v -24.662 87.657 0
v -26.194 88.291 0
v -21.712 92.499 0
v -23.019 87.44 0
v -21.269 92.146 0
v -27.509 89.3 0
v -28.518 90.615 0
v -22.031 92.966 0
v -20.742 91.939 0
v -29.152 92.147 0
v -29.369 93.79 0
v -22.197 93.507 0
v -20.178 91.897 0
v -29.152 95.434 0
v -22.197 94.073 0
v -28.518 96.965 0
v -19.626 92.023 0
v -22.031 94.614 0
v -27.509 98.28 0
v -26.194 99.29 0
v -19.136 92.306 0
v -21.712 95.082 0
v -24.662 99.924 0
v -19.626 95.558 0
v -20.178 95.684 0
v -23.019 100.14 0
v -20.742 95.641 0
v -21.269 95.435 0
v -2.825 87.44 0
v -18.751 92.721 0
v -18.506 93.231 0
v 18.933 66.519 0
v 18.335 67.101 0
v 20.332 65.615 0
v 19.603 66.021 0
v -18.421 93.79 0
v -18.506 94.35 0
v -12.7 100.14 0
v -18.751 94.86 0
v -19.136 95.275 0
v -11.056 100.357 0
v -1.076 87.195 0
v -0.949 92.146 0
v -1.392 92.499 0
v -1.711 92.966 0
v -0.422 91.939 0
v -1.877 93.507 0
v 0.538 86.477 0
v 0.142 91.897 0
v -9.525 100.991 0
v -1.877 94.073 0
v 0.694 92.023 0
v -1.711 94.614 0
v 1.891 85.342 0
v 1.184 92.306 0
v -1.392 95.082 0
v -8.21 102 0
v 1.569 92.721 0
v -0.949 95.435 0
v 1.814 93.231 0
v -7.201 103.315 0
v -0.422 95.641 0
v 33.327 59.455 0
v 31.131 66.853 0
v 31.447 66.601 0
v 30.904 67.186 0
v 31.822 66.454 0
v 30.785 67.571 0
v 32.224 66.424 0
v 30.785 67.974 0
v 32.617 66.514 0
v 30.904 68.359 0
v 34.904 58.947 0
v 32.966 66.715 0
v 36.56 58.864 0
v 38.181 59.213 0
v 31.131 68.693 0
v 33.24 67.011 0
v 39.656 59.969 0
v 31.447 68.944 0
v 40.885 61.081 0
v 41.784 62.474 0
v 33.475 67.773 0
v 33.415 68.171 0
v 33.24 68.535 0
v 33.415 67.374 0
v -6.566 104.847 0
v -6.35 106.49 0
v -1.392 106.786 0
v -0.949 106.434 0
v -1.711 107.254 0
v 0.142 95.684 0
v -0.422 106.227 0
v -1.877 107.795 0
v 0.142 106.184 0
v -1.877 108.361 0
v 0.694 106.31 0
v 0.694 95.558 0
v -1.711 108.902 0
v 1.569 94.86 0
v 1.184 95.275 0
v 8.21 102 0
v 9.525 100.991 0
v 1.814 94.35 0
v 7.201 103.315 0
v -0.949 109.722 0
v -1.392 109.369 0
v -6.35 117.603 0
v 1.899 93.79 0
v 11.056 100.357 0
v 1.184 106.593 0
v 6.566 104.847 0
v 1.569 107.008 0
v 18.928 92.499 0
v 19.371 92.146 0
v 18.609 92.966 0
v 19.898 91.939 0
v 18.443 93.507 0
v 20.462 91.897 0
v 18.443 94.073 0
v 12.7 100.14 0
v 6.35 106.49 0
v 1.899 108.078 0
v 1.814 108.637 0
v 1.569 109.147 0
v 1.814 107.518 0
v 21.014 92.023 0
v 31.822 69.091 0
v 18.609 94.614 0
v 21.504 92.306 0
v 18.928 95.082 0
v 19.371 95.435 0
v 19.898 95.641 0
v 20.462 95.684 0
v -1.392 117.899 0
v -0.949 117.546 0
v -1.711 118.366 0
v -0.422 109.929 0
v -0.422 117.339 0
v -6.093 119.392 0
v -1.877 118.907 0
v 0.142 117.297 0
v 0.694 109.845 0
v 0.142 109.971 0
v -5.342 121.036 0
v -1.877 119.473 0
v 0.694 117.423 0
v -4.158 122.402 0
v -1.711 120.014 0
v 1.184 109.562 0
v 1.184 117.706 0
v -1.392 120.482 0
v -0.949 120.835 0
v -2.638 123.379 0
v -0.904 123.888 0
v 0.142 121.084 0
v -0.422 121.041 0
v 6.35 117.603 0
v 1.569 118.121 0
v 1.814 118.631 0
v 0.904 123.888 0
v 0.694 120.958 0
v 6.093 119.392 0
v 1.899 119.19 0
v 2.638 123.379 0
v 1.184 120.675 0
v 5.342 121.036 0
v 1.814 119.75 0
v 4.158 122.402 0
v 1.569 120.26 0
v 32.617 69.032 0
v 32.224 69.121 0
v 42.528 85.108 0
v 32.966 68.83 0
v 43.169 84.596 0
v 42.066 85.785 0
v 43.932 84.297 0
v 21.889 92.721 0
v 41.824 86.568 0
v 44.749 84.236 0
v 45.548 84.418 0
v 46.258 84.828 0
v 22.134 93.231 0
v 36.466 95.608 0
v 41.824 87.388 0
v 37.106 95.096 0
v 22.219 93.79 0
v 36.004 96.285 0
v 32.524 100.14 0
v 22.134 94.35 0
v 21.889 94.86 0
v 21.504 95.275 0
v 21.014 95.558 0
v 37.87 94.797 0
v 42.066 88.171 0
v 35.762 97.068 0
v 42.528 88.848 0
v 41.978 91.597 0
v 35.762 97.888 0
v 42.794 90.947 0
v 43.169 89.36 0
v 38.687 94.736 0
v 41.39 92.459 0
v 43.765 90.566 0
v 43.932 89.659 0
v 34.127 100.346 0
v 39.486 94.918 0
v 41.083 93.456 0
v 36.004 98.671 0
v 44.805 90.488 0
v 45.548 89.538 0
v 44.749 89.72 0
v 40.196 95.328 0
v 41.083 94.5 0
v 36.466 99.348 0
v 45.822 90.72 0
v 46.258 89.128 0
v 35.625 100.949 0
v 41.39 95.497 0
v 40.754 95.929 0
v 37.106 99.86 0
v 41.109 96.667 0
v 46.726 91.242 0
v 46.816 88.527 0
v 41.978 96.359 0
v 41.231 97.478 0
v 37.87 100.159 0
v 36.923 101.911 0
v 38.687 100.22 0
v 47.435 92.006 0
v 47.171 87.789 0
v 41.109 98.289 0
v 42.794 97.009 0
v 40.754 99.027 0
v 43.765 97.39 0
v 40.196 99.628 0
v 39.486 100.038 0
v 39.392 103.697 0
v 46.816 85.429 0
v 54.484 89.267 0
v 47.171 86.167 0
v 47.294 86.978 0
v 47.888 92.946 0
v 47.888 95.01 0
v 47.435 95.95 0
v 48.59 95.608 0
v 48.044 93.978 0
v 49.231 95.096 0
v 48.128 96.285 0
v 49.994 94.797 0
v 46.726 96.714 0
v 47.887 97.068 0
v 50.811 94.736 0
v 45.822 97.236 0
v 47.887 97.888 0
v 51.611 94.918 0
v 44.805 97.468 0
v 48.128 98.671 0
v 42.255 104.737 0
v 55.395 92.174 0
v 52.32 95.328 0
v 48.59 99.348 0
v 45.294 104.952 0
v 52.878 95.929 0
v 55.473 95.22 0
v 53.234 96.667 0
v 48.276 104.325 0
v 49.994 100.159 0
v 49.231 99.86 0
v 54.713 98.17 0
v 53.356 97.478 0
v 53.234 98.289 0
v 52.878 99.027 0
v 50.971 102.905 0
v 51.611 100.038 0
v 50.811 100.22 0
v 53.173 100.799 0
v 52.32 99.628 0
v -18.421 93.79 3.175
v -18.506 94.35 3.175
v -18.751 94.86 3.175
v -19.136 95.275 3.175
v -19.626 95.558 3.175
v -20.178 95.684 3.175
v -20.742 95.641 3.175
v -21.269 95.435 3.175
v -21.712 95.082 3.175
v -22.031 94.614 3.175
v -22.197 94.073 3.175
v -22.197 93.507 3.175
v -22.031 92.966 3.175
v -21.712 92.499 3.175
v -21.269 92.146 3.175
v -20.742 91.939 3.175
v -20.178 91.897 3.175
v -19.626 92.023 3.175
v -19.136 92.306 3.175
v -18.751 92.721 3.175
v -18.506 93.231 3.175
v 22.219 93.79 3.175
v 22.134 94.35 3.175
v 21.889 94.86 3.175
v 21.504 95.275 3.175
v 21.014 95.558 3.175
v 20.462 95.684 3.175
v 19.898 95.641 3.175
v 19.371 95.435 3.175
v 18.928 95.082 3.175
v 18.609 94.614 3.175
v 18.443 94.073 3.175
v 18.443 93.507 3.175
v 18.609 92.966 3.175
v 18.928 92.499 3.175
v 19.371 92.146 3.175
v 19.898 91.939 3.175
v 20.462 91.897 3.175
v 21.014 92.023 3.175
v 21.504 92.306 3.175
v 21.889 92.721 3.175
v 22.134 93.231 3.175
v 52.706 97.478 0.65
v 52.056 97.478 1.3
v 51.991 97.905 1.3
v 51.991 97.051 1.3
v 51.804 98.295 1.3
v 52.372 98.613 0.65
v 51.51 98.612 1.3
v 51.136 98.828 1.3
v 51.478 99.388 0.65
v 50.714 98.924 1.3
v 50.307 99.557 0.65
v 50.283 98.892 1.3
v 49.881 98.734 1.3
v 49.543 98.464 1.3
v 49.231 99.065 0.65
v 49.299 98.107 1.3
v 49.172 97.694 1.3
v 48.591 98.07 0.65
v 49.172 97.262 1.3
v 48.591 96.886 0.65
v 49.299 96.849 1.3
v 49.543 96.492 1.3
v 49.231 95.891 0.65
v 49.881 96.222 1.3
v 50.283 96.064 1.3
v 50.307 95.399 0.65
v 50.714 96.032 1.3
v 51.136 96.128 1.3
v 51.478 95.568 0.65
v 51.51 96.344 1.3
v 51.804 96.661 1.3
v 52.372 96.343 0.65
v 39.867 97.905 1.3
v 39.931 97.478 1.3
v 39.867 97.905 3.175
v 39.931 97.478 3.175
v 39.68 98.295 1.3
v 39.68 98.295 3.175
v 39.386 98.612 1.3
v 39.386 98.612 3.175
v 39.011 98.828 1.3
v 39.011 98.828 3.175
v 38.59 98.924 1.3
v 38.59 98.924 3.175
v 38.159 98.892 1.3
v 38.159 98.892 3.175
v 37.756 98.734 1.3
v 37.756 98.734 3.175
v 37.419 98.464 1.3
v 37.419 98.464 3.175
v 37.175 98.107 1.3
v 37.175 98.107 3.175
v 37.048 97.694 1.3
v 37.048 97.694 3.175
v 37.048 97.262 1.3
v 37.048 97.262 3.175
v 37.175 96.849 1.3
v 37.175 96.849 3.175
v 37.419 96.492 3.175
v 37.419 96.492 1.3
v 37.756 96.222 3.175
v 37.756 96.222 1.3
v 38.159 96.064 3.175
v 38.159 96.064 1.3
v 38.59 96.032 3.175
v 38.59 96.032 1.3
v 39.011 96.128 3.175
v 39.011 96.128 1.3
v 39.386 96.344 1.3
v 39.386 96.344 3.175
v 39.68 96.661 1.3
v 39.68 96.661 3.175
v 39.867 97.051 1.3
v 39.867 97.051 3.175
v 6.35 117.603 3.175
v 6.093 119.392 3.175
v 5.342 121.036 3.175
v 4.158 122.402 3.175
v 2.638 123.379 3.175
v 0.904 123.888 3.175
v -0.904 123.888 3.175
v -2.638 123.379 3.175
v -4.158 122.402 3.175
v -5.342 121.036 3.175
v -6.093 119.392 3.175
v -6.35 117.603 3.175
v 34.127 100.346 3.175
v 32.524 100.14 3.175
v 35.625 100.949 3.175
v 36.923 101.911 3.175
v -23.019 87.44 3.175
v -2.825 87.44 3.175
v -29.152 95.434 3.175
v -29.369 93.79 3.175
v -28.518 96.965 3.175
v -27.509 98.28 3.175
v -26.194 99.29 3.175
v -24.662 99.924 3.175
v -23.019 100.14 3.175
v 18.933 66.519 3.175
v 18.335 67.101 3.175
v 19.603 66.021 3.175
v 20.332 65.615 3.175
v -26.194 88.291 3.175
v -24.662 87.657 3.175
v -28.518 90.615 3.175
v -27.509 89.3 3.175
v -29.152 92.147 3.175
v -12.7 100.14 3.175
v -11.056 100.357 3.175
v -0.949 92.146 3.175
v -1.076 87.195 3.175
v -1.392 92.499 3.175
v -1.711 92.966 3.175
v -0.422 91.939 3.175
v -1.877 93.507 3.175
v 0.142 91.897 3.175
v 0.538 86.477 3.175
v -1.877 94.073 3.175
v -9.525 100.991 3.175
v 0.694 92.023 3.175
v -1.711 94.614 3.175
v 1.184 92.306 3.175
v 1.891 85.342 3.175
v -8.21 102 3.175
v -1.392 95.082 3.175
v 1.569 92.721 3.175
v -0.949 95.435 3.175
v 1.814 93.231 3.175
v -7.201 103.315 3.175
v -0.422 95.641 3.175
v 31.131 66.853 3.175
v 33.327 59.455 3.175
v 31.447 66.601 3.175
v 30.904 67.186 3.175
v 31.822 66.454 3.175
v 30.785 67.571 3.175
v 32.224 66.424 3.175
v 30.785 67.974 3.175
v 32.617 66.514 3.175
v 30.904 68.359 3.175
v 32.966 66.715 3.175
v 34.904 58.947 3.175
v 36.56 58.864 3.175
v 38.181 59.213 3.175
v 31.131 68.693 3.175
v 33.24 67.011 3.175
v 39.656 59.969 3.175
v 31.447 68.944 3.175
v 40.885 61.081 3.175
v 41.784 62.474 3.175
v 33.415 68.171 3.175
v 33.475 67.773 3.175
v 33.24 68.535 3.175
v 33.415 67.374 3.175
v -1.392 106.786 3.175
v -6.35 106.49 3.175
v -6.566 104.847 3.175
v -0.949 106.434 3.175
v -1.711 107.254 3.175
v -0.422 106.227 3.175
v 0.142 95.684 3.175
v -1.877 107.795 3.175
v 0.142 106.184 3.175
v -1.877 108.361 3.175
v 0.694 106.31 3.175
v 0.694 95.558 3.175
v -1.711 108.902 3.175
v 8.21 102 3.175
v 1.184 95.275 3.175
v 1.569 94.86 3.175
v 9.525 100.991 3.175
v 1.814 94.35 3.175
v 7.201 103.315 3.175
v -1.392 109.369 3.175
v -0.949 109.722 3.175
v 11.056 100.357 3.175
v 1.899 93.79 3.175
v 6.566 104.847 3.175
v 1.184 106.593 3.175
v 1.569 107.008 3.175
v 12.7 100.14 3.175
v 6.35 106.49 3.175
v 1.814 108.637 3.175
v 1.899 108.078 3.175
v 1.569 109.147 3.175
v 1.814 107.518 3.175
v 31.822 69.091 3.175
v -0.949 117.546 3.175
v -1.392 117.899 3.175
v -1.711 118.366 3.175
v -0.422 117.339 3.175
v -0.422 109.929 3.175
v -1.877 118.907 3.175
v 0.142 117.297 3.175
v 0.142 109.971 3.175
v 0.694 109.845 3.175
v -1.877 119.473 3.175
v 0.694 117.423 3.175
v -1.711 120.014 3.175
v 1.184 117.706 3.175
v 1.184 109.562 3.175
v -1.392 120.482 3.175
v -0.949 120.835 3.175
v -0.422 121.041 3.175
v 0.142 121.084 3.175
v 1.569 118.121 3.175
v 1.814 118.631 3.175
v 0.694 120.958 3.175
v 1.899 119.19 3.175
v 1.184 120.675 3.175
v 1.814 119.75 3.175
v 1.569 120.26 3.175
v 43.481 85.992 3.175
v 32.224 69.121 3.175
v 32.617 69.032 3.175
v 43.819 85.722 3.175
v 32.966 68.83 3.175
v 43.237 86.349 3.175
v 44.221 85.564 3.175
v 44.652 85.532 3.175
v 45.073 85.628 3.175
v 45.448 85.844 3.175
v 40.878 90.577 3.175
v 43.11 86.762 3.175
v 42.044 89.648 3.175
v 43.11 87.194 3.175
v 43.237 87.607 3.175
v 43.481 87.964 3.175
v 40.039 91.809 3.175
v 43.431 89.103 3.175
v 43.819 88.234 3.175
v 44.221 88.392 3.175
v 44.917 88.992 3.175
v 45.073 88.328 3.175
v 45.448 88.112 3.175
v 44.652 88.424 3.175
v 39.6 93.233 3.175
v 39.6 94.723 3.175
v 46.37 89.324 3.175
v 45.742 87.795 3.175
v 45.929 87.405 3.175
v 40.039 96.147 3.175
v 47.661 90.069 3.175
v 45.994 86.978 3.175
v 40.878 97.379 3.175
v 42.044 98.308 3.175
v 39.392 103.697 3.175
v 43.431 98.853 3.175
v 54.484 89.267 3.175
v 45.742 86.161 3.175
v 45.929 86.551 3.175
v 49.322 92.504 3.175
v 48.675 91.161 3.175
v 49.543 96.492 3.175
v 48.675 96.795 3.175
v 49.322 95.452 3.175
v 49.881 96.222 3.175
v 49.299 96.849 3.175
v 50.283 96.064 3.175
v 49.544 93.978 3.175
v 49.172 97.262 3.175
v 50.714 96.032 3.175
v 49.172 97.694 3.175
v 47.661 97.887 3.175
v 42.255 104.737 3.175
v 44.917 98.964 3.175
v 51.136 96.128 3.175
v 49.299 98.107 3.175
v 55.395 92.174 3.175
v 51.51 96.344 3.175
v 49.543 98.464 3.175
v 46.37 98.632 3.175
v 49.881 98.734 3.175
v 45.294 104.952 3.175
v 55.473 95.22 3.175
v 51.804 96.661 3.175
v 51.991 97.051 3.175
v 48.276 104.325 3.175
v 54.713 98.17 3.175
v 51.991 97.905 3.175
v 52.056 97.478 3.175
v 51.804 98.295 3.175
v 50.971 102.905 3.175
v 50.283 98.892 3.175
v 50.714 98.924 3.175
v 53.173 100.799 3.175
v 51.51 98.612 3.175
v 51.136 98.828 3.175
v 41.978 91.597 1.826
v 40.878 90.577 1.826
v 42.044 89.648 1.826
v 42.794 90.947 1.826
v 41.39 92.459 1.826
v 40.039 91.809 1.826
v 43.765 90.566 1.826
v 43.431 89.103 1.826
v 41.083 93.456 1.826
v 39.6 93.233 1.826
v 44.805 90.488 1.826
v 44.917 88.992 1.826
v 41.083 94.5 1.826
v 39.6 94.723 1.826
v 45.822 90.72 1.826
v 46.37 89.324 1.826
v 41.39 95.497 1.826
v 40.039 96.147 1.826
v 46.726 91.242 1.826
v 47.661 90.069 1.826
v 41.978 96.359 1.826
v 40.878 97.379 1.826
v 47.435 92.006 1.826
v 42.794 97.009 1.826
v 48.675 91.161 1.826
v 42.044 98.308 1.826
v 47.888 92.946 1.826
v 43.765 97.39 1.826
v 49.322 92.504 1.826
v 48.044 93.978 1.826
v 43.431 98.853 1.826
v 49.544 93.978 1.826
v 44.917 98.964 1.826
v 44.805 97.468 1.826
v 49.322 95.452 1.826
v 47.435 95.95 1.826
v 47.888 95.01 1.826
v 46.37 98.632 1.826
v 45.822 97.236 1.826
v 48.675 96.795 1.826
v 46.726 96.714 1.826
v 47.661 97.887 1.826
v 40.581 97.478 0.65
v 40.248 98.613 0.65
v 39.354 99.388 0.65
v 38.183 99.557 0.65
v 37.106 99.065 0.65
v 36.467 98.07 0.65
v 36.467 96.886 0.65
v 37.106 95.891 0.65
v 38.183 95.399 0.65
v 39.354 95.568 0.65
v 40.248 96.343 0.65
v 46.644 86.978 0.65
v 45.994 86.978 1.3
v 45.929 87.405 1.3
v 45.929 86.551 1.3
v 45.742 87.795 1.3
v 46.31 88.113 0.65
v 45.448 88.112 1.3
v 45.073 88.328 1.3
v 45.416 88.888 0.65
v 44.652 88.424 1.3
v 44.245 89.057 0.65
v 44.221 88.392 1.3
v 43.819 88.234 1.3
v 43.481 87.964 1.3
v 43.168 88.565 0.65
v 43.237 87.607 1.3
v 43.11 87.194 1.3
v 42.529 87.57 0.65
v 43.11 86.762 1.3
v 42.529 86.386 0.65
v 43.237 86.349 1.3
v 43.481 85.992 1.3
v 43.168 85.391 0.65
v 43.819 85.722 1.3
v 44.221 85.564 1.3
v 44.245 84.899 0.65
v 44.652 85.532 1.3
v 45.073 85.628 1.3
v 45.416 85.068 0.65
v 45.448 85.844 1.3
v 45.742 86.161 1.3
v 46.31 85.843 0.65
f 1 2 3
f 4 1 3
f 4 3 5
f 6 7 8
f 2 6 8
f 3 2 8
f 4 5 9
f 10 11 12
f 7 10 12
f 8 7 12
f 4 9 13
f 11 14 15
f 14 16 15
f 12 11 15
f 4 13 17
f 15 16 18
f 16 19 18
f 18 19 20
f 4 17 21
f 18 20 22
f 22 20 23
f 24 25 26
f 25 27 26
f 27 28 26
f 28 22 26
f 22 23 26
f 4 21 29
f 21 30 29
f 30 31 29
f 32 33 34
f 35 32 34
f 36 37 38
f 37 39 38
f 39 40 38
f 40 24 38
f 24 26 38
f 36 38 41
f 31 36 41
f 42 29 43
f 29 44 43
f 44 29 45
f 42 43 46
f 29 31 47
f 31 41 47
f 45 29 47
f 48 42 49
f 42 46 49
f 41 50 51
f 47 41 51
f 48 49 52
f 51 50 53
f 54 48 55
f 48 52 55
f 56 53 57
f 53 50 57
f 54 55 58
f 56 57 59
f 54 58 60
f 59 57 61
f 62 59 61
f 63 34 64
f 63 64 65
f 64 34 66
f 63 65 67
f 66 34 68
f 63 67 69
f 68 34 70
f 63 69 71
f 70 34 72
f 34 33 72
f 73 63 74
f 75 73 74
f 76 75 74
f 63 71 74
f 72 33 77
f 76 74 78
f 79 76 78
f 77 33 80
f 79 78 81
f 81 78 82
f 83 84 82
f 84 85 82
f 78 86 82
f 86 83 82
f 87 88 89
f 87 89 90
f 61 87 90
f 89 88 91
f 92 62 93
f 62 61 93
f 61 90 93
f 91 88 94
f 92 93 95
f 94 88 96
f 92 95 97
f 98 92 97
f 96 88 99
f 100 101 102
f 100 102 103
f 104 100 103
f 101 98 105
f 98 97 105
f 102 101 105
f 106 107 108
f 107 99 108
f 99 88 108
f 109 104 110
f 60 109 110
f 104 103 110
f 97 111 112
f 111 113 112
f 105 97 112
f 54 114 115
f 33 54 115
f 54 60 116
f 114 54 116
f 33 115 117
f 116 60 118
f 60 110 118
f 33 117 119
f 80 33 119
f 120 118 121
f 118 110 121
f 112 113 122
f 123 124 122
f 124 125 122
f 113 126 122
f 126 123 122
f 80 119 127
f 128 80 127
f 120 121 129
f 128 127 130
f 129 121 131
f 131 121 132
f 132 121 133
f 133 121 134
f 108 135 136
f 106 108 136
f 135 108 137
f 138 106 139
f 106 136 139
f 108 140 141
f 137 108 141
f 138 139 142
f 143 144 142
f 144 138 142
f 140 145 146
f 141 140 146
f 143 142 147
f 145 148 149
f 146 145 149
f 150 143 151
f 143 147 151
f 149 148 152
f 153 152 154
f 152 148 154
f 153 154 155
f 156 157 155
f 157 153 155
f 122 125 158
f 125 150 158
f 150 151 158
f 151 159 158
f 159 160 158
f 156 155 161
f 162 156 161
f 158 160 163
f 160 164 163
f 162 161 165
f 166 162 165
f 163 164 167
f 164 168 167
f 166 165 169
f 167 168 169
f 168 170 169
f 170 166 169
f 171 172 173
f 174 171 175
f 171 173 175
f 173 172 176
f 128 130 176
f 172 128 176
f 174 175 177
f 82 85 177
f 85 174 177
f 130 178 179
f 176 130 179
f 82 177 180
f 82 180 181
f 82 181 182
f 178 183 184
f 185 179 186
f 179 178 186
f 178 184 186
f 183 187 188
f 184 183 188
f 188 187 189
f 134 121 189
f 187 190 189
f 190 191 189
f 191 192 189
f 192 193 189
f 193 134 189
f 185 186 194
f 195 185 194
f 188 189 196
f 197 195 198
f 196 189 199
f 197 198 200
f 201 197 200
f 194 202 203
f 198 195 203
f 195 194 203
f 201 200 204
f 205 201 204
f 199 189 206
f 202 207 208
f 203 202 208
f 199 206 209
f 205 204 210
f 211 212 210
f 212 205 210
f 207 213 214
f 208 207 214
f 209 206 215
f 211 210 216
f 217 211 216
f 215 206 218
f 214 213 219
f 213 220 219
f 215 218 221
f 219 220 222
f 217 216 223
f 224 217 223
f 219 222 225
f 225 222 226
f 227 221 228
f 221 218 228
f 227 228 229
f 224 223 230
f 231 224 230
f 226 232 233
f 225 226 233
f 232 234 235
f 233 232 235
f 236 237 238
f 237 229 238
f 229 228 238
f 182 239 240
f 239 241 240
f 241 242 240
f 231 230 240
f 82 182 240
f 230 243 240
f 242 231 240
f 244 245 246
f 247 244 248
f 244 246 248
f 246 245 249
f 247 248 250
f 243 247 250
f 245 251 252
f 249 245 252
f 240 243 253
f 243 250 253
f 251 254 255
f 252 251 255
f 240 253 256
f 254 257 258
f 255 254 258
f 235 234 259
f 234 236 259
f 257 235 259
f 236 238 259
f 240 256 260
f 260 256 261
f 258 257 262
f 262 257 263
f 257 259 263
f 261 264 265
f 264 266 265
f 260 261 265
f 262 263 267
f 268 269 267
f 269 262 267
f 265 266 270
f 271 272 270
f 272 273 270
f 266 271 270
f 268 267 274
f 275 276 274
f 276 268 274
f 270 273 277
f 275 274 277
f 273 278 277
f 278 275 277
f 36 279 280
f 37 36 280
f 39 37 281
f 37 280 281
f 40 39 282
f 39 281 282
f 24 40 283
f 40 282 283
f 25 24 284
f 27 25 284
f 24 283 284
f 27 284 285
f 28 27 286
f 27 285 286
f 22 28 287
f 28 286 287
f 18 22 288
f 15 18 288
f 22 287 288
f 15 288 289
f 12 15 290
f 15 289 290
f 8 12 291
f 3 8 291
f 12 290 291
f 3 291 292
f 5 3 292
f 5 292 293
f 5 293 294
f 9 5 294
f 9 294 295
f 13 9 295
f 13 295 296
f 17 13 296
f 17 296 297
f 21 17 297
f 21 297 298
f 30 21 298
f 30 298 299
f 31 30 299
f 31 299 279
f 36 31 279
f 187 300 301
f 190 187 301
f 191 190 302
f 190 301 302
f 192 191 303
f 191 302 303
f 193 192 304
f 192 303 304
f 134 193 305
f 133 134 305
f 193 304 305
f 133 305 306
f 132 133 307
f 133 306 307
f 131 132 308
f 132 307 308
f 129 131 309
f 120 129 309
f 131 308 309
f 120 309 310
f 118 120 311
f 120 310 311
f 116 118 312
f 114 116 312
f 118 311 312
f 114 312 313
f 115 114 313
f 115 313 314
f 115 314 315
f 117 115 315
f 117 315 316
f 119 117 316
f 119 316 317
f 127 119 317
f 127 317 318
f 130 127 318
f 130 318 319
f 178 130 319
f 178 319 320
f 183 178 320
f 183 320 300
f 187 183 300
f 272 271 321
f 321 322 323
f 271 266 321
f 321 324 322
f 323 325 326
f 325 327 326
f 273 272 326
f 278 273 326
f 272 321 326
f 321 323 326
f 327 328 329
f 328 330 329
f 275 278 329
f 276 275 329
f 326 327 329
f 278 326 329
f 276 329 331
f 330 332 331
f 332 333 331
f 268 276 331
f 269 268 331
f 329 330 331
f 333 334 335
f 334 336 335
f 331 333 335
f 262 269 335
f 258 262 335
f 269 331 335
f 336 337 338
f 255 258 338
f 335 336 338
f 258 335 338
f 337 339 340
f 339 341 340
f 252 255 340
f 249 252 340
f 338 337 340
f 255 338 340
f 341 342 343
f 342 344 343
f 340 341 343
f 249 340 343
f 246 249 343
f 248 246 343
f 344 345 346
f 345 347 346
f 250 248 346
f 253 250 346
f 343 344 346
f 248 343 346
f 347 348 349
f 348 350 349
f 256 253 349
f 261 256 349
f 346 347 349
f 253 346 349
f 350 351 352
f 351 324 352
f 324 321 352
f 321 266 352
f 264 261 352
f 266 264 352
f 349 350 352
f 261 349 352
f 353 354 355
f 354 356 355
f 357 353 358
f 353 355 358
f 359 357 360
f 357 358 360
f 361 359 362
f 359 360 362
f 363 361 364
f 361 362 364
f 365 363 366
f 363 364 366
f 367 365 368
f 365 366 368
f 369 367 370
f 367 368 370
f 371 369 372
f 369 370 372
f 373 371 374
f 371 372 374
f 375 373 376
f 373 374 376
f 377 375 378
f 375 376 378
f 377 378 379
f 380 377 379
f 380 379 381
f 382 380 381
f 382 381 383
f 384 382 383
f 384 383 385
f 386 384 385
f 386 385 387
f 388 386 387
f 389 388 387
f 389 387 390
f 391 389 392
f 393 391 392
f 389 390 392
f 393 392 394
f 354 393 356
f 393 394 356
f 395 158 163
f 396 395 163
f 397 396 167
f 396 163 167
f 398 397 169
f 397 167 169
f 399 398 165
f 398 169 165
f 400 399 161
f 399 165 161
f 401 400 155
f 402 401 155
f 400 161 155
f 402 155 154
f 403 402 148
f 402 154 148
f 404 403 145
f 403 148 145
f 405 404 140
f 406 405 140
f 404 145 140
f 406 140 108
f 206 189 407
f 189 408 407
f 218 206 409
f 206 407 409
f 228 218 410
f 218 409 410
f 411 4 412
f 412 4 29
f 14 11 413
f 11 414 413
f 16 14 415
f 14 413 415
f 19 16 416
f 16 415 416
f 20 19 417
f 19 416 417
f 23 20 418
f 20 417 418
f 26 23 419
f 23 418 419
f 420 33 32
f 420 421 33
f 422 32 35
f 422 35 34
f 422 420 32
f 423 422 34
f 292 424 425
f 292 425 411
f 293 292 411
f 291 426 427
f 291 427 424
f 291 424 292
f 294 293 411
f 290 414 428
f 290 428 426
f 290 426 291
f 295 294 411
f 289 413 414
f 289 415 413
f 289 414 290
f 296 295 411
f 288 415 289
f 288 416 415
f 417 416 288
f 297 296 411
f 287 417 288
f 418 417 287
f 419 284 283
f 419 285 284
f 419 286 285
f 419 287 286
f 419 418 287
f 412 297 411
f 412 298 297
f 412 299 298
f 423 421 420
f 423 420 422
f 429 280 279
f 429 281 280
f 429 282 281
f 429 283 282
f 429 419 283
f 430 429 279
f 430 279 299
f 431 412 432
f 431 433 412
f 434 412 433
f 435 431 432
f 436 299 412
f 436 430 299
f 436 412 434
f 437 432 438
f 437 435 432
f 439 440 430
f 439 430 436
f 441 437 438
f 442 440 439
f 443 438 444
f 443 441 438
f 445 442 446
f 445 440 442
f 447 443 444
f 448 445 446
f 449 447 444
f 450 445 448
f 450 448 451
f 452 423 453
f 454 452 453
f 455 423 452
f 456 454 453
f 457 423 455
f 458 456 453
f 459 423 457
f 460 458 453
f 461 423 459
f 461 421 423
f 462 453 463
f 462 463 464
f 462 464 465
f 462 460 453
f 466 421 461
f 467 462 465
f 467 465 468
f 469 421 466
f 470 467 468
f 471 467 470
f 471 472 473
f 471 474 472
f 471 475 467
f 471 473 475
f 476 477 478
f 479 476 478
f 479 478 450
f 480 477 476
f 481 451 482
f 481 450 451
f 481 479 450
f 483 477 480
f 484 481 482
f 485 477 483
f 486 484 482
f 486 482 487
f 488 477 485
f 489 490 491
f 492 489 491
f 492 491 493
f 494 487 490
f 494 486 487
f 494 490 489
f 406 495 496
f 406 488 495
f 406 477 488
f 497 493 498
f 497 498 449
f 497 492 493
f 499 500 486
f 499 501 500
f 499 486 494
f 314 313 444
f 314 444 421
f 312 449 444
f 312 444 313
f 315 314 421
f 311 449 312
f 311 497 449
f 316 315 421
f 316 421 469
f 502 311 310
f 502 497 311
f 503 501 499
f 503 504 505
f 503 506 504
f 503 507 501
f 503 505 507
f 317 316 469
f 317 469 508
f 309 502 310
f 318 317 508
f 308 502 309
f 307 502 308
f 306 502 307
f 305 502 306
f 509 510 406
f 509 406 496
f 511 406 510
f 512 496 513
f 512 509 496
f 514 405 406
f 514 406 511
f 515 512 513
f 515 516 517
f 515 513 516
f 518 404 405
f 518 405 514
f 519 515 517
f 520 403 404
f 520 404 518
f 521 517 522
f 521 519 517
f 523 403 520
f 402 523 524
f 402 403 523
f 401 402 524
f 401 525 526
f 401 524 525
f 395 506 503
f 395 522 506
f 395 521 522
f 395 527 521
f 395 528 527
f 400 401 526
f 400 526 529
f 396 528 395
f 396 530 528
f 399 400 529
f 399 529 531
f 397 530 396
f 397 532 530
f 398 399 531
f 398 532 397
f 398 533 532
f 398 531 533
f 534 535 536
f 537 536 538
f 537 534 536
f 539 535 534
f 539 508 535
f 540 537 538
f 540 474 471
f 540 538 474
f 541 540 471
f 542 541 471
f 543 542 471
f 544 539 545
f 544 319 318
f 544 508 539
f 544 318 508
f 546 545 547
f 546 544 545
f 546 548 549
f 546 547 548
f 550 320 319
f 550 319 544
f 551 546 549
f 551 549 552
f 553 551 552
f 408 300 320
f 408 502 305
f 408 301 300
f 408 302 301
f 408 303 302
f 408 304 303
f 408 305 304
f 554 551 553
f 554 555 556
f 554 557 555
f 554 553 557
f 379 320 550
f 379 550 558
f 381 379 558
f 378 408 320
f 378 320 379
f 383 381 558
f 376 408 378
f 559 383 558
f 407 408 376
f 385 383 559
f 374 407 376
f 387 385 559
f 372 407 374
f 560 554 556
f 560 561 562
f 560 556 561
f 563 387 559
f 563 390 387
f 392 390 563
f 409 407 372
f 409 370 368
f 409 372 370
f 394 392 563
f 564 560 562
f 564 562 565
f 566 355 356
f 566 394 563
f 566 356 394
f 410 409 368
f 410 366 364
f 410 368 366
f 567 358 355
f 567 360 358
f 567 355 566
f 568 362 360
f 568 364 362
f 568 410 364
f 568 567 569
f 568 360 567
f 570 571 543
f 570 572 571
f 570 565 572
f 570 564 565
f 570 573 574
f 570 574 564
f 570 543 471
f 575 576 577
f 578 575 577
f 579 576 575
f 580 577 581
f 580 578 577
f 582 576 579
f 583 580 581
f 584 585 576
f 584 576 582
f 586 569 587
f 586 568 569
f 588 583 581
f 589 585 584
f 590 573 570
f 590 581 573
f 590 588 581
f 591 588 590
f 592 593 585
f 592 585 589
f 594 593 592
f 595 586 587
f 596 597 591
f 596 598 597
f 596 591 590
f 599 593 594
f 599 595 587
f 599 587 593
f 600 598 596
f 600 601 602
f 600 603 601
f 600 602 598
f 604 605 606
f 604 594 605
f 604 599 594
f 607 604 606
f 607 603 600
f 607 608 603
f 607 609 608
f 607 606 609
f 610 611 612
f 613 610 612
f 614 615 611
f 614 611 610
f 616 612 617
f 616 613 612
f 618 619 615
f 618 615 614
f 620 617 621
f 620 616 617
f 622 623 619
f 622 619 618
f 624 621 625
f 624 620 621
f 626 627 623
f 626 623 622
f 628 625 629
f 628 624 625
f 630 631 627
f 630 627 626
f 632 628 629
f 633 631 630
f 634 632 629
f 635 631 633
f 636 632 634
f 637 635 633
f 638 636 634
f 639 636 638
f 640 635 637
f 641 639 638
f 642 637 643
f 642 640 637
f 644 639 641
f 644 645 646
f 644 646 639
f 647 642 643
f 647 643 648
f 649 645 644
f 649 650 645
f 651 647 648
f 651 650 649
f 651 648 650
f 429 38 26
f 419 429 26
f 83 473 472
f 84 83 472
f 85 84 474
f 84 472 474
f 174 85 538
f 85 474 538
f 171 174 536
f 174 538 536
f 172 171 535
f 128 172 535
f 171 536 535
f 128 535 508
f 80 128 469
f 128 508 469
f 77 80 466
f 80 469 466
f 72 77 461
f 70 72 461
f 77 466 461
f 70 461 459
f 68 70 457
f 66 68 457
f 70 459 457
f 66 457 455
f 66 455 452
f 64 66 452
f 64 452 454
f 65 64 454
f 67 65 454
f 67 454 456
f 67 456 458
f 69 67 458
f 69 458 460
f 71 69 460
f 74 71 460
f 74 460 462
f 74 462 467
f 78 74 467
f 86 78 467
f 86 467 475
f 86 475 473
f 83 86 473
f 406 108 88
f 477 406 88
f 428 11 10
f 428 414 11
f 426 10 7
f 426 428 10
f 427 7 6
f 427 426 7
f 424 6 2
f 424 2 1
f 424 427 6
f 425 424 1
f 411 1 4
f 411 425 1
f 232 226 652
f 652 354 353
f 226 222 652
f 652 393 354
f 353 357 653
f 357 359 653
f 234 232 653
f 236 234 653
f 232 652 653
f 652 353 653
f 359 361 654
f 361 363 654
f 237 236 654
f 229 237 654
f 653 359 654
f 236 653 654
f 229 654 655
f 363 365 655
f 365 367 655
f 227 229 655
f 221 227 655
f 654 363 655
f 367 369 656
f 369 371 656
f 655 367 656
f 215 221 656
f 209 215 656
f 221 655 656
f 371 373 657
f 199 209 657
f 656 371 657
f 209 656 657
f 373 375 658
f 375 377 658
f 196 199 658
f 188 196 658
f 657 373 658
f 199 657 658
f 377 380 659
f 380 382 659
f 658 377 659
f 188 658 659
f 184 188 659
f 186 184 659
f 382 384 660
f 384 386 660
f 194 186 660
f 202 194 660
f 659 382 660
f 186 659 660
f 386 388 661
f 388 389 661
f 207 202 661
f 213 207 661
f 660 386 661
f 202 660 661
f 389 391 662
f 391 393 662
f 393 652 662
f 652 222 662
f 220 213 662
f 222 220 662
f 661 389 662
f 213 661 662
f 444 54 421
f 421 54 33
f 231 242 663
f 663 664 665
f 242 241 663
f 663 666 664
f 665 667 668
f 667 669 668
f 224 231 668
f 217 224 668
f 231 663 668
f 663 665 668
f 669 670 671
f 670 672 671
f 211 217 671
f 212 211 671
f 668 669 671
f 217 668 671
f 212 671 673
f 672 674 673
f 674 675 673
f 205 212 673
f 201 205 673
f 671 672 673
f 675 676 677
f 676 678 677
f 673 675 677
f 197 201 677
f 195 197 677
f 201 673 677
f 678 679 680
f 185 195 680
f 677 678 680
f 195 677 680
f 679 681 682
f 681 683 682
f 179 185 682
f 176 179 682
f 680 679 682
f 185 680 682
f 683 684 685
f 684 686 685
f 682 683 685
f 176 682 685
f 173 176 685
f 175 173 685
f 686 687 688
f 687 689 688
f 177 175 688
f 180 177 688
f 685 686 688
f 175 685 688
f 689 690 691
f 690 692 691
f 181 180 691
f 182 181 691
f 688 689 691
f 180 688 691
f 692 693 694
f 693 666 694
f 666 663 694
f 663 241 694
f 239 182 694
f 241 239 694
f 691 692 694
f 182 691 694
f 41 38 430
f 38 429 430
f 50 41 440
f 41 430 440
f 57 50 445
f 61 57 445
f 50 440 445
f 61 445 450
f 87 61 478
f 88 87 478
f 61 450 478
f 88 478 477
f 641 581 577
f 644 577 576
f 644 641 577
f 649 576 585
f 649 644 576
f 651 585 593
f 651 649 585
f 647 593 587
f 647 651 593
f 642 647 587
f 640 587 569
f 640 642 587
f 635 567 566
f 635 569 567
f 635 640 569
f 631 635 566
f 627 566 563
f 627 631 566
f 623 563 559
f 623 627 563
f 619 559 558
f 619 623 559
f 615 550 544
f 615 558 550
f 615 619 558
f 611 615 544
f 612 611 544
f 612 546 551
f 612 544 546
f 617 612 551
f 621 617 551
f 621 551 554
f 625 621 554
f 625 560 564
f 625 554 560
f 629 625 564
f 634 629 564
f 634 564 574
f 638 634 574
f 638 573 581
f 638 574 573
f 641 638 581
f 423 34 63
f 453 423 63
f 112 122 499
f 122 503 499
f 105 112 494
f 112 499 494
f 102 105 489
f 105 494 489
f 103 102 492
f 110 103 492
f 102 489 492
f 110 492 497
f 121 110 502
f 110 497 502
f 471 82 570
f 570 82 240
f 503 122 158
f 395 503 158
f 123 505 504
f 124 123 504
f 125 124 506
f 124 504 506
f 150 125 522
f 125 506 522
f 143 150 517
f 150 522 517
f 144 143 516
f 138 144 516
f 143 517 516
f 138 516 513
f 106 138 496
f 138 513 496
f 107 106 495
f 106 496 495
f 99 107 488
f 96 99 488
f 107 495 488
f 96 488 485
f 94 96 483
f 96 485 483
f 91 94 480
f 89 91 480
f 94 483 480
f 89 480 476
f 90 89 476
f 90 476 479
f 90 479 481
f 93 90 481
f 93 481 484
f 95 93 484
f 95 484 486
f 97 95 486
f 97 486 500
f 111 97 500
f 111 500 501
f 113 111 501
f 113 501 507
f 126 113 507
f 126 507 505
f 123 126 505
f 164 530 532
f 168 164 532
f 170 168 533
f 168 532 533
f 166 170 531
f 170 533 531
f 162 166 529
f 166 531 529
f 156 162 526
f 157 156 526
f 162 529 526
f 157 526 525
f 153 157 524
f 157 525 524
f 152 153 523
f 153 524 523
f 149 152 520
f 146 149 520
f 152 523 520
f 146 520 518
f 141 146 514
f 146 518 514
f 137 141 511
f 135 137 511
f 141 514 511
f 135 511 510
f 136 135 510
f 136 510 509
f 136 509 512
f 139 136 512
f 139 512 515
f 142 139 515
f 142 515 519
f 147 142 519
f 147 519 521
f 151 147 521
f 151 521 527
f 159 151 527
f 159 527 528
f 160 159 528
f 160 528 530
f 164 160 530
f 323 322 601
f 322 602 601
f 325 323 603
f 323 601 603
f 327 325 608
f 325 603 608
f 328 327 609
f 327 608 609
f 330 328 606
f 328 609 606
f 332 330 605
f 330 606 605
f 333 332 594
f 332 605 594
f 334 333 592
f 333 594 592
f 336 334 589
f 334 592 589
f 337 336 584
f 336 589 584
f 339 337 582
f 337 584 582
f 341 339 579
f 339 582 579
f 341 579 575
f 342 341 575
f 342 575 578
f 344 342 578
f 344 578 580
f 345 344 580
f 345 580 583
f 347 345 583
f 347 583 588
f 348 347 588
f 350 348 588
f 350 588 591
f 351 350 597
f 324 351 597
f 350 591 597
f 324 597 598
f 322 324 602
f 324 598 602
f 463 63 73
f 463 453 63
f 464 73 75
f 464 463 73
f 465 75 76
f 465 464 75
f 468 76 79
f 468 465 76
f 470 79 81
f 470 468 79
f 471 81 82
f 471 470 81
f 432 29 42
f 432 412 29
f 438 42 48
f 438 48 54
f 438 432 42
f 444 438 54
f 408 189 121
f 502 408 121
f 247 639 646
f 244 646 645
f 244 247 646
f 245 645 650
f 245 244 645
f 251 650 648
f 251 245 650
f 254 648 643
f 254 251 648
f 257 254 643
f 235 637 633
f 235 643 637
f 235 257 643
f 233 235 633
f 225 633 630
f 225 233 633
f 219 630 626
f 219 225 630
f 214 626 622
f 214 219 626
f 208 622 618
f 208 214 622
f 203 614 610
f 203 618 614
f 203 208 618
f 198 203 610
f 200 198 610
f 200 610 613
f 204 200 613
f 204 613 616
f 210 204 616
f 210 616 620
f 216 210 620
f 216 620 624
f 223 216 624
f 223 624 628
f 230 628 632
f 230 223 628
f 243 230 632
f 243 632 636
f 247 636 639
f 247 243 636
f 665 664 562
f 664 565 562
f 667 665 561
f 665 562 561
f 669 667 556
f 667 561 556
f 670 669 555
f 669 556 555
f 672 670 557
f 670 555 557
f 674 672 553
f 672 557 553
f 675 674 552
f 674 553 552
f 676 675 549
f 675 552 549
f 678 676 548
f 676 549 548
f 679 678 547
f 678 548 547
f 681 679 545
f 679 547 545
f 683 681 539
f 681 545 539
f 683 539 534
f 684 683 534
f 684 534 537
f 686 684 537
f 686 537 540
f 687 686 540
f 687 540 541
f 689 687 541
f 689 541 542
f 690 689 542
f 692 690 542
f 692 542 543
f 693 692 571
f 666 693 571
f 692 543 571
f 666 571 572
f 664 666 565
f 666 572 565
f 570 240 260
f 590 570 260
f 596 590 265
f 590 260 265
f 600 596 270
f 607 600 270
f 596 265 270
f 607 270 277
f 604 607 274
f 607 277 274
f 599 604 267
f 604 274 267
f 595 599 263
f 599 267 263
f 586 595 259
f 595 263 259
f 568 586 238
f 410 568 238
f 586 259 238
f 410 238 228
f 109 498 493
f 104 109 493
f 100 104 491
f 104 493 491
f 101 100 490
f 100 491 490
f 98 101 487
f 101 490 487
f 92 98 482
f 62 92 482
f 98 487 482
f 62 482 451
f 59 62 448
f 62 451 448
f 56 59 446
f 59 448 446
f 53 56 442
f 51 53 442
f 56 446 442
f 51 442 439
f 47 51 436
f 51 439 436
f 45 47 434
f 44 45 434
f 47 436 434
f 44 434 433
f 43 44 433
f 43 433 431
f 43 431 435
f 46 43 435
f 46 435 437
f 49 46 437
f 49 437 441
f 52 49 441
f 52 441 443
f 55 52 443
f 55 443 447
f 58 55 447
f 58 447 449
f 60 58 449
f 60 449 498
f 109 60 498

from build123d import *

# Parameters (mm, degrees)
SKETCH1_R                                        = 3.5
BODY_DEPTH                                       = 3.175
F_6_GIMBAL_CLEARANCE_HOLE_D                      = 3.7973
F_6_GIMBAL_CLEARANCE_HOLE_DEPTH                  = 12
F_6_GIMBAL_CLEARANCE_HOLE_TIP                    = 1.140824014
CSK_FOR_M2_5_FLAT_HEAD_MACHINE_SCREW_D           = 2.9
CSK_FOR_M2_5_FLAT_HEAD_MACHINE_SCREW_CSINK_D     = 5.5
CSK_FOR_M2_5_FLAT_HEAD_MACHINE_SCREW_CSINK_ANGLE = 90
F_6_CIRCULAR_CLEARANCE_HOLES_D                   = 3.7973
F_6_CIRCULAR_CLEARANCE_HOLES_DEPTH               = 12
F_6_CIRCULAR_CLEARANCE_HOLES_TIP                 = 1.140824014
MOTOR_START                                      = 1.82626
SKETCH1_3_R                                      = 5
MOTOR_COLLAR_RELIEF_DEPTH                        = 135.039371942
F_6_32_TAPPED_HOLE_D                             = 2.7051
F_6_32_TAPPED_HOLE_DEPTH                         = 180.4416
F_6_32_TAPPED_HOLE_TIP                           = 0.81269403
FILLET1_R                                        = 6.35


with BuildPart() as part:
    # Sketch1 → Body (new body)
    with BuildSketch(Plane.XY):
        with BuildLine():
            Line((-29.36875, 100.140279829), (-29.36875, 87.440279829))
            Line((-29.36875, 87.440279829), (0, 87.440279829))
            Line((0, 87.440279829), (19.184718186, 66.158495963))
            Line((19.184718186, 66.158495963), (39.064677756, 56.735799561))
            Line((39.064677756, 56.735799561), (54.483635505, 89.266642494))
            ThreePointArc((54.483635505, 89.266642494), (49.996218262, 103.531501135), (35.431784746, 100.140279829))
            Line((35.431784746, 100.140279829), (6.35, 100.140279829))
            Line((6.35, 100.140279829), (6.35, 117.602779829))
            ThreePointArc((6.35, 117.602779829), (0, 123.952779829), (-6.35, 117.602779829))
            Line((-6.35, 117.602779829), (-6.35, 100.140279829))
            Line((-6.35, 100.140279829), (-29.36875, 100.140279829))
        make_face()
        with Locations((44.54365572, 93.977990695)):
            Circle(SKETCH1_R, mode=Mode.SUBTRACT)
    extrude(amount=BODY_DEPTH)

    # #6 Gimbal Clearance Hole
    with Locations(Plane(origin=(0, 108.077779829, 0), x_dir=(-1, 0, 0), z_dir=(0, 0, -1))):
        with Locations((0, 0), (0, 11.1125)):
            Hole(F_6_GIMBAL_CLEARANCE_HOLE_D / 2, depth=F_6_GIMBAL_CLEARANCE_HOLE_DEPTH)
            with Locations((0, 0, -(F_6_GIMBAL_CLEARANCE_HOLE_DEPTH + F_6_GIMBAL_CLEARANCE_HOLE_TIP / 2))):  # 118° drill point
                Cone(0, F_6_GIMBAL_CLEARANCE_HOLE_D / 2, F_6_GIMBAL_CLEARANCE_HOLE_TIP, mode=Mode.SUBTRACT)

    # CSK for M2.5 Flat Head Machine Screw (through all)
    with Locations(Plane(origin=(50.605833546, 97.477990695, 0), x_dir=(-1, 0, 0), z_dir=(0, 0, -1))):
        with Locations((0, 0), (6.062177826, -10.5), (12.124355653, 0)):
            CounterSinkHole(CSK_FOR_M2_5_FLAT_HEAD_MACHINE_SCREW_D / 2, CSK_FOR_M2_5_FLAT_HEAD_MACHINE_SCREW_CSINK_D / 2, counter_sink_angle=CSK_FOR_M2_5_FLAT_HEAD_MACHINE_SCREW_CSINK_ANGLE)

    # #6 Circular Clearance Holes
    with Locations(Plane(origin=(-20.32, 93.790279829, 0), x_dir=(-1, 0, 0), z_dir=(0, 0, -1))):
        with Locations((0, 0), (-20.32, 0), (-40.64, 0)):
            Hole(F_6_CIRCULAR_CLEARANCE_HOLES_D / 2, depth=F_6_CIRCULAR_CLEARANCE_HOLES_DEPTH)
            with Locations((0, 0, -(F_6_CIRCULAR_CLEARANCE_HOLES_DEPTH + F_6_CIRCULAR_CLEARANCE_HOLES_TIP / 2))):  # 118° drill point
                Cone(0, F_6_CIRCULAR_CLEARANCE_HOLES_D / 2, F_6_CIRCULAR_CLEARANCE_HOLES_TIP, mode=Mode.SUBTRACT)

    # Sketch1<3> → Motor Collar Relief (cut, through all)
    with BuildSketch(Plane.XY.offset(MOTOR_START)):
        with Locations((44.54365572, 93.977990695)):
            Circle(SKETCH1_3_R)
    extrude(amount=MOTOR_COLLAR_RELIEF_DEPTH, mode=Mode.SUBTRACT)

    # #6-32 Tapped Hole
    with Locations(Plane(origin=(32.122828644, 67.772589444, 0), x_dir=(-1, 0, 0), z_dir=(0, 0, -1))):
        with Locations((0, 0)):
            Hole(F_6_32_TAPPED_HOLE_D / 2, depth=F_6_32_TAPPED_HOLE_DEPTH)
            with Locations((0, 0, -(F_6_32_TAPPED_HOLE_DEPTH + F_6_32_TAPPED_HOLE_TIP / 2))):  # 118° drill point
                Cone(0, F_6_32_TAPPED_HOLE_D / 2, F_6_32_TAPPED_HOLE_TIP, mode=Mode.SUBTRACT)

    # Fillet1
    fillet1_edges = [part.edges().sort_by_distance(p)[0] for p in [
        (0, 87.440279829, 1.5875),
        (-29.36875, 87.440279829, 1.5875),
        (-29.36875, 100.140279829, 1.5875),
        (-6.35, 100.140279829, 1.5875),
        (6.35, 100.140279829, 1.5875),
        (35.431784746, 100.140279829, 1.5875),
        (39.064677756, 56.735799561, 1.5875),
        (19.184718186, 66.158495963, 1.5875),
    ]]
    fillet(fillet1_edges, radius=FILLET1_R - 0.0001)  # a hair under: the kernel refuses the full size


solid = part.part
